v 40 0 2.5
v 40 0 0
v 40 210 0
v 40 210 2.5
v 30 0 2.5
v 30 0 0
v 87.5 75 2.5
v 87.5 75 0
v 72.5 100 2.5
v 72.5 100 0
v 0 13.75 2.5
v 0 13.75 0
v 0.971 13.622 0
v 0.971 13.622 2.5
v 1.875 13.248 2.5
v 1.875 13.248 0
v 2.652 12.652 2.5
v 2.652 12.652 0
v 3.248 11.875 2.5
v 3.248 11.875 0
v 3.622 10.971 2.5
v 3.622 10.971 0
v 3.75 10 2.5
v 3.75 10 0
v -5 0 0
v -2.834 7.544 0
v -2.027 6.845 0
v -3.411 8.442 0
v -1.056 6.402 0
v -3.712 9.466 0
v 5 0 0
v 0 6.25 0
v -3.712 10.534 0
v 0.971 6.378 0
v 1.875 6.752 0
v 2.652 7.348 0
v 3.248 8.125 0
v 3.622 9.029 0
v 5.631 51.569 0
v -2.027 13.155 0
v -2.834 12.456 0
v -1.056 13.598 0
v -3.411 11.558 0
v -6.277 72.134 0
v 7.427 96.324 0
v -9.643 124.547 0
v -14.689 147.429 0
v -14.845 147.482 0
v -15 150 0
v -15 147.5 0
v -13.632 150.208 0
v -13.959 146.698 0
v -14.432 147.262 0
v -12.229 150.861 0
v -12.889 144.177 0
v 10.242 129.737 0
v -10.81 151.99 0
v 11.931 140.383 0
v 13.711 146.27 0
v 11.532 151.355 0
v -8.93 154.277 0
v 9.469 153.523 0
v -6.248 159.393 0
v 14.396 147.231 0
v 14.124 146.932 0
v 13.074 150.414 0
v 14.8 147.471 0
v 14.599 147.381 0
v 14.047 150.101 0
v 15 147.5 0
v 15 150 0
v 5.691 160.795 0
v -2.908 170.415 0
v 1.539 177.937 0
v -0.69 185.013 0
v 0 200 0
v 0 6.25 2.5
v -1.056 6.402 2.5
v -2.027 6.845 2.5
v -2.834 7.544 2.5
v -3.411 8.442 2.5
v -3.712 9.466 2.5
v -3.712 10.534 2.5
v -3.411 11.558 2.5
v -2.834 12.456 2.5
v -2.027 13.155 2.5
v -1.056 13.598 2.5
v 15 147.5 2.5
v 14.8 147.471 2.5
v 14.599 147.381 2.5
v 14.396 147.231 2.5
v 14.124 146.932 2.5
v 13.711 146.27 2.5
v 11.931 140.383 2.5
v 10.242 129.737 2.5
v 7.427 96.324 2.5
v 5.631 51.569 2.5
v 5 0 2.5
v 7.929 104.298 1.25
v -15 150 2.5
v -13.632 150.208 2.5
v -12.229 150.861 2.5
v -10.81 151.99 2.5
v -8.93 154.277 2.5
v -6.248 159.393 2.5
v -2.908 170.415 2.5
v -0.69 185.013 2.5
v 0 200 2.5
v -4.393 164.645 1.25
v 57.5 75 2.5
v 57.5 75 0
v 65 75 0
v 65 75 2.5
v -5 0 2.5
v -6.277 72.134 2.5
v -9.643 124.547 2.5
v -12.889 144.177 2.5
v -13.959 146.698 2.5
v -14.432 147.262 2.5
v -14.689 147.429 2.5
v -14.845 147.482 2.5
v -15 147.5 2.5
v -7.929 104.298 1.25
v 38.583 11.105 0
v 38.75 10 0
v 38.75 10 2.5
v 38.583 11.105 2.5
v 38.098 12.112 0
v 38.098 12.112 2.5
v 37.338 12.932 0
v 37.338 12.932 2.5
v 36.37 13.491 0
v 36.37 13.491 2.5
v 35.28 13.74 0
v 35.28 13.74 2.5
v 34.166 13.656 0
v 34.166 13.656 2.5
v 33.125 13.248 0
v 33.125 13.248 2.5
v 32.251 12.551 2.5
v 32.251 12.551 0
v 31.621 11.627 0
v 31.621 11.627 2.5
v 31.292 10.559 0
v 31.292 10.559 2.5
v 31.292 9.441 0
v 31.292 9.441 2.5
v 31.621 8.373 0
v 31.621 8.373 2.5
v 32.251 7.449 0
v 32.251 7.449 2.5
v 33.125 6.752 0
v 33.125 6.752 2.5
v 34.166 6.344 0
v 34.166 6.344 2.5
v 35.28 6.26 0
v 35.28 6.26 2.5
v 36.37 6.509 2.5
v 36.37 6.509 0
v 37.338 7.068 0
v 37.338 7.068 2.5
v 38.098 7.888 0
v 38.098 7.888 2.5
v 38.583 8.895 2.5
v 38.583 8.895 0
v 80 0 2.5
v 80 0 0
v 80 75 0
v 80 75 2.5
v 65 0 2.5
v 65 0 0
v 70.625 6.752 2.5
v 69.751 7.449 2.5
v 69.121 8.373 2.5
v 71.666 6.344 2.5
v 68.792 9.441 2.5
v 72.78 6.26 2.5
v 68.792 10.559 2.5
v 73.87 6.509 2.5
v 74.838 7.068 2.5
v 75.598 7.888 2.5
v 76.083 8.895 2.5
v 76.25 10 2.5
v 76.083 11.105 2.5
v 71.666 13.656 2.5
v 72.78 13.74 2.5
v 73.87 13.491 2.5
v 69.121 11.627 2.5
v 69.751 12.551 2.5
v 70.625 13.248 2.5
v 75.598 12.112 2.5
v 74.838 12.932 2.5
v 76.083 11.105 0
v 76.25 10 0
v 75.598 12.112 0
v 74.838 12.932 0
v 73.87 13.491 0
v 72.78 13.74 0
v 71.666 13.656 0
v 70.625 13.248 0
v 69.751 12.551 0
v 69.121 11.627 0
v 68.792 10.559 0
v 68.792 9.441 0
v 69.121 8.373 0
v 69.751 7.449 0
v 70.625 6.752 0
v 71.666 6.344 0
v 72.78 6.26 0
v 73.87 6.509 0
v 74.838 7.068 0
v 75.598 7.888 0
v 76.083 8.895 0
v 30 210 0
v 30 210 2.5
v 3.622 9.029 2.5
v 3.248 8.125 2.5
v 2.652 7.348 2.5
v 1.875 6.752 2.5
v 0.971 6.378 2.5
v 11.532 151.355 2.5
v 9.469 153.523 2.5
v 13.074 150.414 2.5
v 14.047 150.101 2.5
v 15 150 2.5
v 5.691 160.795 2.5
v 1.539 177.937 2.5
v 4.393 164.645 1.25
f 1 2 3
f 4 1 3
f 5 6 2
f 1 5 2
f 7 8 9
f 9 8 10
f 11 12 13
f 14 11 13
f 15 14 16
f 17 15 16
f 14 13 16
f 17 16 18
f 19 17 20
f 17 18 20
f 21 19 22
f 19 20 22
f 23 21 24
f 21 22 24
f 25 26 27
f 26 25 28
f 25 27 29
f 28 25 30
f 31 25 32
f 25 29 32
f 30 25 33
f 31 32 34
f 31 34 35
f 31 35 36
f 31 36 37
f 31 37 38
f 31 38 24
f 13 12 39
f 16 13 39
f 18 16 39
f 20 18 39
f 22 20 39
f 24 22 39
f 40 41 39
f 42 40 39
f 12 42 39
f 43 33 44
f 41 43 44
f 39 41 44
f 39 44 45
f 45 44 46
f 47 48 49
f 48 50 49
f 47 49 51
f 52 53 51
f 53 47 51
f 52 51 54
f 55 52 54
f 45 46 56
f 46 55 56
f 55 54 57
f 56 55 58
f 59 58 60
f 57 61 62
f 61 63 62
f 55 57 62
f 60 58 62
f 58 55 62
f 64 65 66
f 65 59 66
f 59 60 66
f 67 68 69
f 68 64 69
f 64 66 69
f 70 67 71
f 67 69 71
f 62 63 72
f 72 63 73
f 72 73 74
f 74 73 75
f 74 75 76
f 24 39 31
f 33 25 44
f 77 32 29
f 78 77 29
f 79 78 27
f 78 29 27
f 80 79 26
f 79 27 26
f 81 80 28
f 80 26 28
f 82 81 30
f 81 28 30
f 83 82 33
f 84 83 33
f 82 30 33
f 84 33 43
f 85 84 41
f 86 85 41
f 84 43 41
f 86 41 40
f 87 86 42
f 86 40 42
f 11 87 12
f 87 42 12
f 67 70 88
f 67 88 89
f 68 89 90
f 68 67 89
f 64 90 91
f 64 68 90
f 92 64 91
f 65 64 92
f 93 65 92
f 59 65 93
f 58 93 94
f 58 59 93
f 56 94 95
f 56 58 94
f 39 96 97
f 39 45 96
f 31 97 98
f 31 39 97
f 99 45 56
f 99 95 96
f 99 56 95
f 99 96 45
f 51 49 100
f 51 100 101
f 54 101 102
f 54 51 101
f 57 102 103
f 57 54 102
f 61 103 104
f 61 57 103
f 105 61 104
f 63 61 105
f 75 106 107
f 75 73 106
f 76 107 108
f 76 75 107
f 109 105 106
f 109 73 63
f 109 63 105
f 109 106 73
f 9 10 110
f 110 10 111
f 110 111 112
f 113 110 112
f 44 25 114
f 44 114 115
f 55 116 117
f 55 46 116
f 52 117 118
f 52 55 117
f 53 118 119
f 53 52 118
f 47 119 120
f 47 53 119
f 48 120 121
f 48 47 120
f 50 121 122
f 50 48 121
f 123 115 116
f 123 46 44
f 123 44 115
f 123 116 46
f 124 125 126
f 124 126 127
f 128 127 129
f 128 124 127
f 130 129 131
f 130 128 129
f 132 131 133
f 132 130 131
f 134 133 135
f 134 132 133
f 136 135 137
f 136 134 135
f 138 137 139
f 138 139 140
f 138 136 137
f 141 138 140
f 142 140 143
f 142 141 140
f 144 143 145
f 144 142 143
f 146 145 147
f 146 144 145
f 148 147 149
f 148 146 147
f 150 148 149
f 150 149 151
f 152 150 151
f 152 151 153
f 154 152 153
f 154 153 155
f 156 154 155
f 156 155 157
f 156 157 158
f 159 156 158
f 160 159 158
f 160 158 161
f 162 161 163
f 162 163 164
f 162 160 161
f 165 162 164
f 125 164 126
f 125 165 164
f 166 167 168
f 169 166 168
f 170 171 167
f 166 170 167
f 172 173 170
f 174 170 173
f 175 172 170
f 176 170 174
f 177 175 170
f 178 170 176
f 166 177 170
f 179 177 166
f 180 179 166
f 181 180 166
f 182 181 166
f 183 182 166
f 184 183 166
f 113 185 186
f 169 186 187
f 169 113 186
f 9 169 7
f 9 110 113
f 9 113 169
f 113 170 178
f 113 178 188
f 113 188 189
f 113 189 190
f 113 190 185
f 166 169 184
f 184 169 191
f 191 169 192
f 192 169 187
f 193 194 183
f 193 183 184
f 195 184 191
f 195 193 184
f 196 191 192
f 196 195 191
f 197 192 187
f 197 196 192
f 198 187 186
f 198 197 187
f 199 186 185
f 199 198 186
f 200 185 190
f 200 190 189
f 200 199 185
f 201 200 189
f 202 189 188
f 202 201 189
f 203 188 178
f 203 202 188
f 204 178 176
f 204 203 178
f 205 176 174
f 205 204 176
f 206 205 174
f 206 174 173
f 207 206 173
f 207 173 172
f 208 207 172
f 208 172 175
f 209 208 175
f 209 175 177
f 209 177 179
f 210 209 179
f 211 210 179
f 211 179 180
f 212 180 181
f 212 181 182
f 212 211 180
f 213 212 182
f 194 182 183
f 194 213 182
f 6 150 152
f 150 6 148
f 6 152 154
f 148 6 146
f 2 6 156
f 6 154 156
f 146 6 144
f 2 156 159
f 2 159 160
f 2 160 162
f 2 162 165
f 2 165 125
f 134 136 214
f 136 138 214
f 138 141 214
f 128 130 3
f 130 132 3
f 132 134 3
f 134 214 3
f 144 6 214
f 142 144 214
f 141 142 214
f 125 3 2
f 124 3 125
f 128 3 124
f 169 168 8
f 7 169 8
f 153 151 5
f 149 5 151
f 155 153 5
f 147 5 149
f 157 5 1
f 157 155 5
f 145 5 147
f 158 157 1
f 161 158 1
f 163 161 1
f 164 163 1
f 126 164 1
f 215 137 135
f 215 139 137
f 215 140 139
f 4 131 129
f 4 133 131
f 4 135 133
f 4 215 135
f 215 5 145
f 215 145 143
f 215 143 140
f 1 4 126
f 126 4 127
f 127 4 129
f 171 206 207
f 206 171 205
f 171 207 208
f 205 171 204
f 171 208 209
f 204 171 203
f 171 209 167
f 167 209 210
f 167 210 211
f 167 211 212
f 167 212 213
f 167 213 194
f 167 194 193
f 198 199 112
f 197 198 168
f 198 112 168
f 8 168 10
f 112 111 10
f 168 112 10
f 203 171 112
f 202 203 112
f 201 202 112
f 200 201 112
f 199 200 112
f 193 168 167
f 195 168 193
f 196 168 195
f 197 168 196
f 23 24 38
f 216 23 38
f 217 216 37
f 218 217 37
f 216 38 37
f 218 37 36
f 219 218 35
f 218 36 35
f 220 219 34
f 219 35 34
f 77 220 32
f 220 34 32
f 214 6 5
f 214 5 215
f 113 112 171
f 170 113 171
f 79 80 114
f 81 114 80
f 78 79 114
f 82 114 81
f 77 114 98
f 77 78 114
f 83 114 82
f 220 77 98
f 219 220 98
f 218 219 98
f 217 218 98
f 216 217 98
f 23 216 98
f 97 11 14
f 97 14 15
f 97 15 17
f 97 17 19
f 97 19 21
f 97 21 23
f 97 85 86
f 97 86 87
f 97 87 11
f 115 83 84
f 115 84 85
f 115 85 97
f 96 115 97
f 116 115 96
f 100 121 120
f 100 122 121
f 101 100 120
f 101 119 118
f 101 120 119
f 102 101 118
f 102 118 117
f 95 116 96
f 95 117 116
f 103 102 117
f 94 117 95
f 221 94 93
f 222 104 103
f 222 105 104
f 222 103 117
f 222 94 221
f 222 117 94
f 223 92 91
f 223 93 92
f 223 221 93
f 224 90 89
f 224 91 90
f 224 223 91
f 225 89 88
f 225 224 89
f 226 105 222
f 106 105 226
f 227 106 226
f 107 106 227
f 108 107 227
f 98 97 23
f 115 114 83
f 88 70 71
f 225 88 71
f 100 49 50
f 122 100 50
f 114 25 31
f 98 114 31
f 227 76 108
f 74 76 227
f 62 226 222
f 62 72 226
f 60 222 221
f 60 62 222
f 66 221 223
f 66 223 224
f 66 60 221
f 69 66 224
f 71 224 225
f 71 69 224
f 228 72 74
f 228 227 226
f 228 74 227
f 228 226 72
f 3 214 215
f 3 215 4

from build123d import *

# Parameters (mm, degrees)
F0_W     = 10
F0_H     = 2.5
F1_DEPTH = 2.5
F2_W     = 10
F2_H     = 210
F2_R     = 3.75
F3_DEPTH = 2.5
F4_R     = 3.75
F5_DEPTH = 2.5


with BuildPart() as f1:
    # F0 (on Top) → F1 (new body)
    with BuildSketch(Plane.XY):
        with BuildLine():
            Line((0, 6.25), (0, 0))
            Line((0, 0), (5, 0))
            add(Edge.make_bspline(
                [(15, 147.5), (5, 147.5), (5, 0)],
                knots=[3.1415926536, 3.1415926536, 3.1415926536, 4.7123889804, 4.7123889804, 4.7123889804], degree=2, weights=[1, 0.7071067812, 1]))
            Line((15, 147.5), (5, 147.5))
            Line((5, 147.5), (5, 150))
            Line((5, 150), (0, 150))
            Line((0, 150), (0, 13.75))
            ThreePointArc((0, 13.75), (2.6516504294, 12.6516504294), (3.75, 10))
            ThreePointArc((3.75, 10), (2.6516504294, 7.3483495706), (0, 6.25))
        make_face()
        with Locations((10, 148.75)):
            Rectangle(F0_W, F0_H)
        with BuildLine():
            Line((0, 200), (0, 150))
            Line((0, 150), (5, 150))
            Line((5, 150), (15, 150))
            add(Edge.make_bspline(
                [(0, 200), (0, 150), (15, 150)],
                knots=[4.7123889804, 4.7123889804, 4.7123889804, 6.2831853072, 6.2831853072, 6.2831853072], degree=2, weights=[1, 0.7071067812, 1]))
        make_face()
        with BuildLine():
            Line((-5, 0), (0, 0))
            Line((0, 0), (0, 6.25))
            ThreePointArc((0, 6.25), (-3.75, 10), (0, 13.75))
            Line((0, 13.75), (0, 150))
            Line((0, 150), (0, 200))
            add(Edge.make_bspline(
                [(-15, 150), (0, 150), (0, 200)],
                knots=[3.1415926536, 3.1415926536, 3.1415926536, 4.7123889804, 4.7123889804, 4.7123889804], degree=2, weights=[1, 0.7071067812, 1]))
            Line((-15, 150), (-15, 147.5))
            add(Edge.make_bspline(
                [(-5, 0), (-5, 147.5), (-15, 147.5)],
                knots=[1.5707963268, 1.5707963268, 1.5707963268, 3.1415926536, 3.1415926536, 3.1415926536], degree=2, weights=[1, 0.7071067812, 1]))
        make_face()
    extrude(amount=F1_DEPTH)


with BuildPart() as f3:
    # F2 (on Top) → F3 (new body)
    with BuildSketch(Plane.XY):
        with Locations((35, 105)):
            Rectangle(F2_W, F2_H)
        with Locations((35, 10)):
            Circle(F2_R, mode=Mode.SUBTRACT)
    extrude(amount=F3_DEPTH)


with BuildPart() as f5:
    # F4 (on Top) → F5 (new body)
    with BuildSketch(Plane.XY):
        Polygon((65, 75), (65, 0), (80, 0), (80, 75), (87.5, 75), (72.5, 100), (57.5, 75), align=None)
        with Locations((72.5, 10)):
            Circle(F4_R, mode=Mode.SUBTRACT)
    extrude(amount=F5_DEPTH)


solid = Compound([f1.part, f3.part, f5.part])
